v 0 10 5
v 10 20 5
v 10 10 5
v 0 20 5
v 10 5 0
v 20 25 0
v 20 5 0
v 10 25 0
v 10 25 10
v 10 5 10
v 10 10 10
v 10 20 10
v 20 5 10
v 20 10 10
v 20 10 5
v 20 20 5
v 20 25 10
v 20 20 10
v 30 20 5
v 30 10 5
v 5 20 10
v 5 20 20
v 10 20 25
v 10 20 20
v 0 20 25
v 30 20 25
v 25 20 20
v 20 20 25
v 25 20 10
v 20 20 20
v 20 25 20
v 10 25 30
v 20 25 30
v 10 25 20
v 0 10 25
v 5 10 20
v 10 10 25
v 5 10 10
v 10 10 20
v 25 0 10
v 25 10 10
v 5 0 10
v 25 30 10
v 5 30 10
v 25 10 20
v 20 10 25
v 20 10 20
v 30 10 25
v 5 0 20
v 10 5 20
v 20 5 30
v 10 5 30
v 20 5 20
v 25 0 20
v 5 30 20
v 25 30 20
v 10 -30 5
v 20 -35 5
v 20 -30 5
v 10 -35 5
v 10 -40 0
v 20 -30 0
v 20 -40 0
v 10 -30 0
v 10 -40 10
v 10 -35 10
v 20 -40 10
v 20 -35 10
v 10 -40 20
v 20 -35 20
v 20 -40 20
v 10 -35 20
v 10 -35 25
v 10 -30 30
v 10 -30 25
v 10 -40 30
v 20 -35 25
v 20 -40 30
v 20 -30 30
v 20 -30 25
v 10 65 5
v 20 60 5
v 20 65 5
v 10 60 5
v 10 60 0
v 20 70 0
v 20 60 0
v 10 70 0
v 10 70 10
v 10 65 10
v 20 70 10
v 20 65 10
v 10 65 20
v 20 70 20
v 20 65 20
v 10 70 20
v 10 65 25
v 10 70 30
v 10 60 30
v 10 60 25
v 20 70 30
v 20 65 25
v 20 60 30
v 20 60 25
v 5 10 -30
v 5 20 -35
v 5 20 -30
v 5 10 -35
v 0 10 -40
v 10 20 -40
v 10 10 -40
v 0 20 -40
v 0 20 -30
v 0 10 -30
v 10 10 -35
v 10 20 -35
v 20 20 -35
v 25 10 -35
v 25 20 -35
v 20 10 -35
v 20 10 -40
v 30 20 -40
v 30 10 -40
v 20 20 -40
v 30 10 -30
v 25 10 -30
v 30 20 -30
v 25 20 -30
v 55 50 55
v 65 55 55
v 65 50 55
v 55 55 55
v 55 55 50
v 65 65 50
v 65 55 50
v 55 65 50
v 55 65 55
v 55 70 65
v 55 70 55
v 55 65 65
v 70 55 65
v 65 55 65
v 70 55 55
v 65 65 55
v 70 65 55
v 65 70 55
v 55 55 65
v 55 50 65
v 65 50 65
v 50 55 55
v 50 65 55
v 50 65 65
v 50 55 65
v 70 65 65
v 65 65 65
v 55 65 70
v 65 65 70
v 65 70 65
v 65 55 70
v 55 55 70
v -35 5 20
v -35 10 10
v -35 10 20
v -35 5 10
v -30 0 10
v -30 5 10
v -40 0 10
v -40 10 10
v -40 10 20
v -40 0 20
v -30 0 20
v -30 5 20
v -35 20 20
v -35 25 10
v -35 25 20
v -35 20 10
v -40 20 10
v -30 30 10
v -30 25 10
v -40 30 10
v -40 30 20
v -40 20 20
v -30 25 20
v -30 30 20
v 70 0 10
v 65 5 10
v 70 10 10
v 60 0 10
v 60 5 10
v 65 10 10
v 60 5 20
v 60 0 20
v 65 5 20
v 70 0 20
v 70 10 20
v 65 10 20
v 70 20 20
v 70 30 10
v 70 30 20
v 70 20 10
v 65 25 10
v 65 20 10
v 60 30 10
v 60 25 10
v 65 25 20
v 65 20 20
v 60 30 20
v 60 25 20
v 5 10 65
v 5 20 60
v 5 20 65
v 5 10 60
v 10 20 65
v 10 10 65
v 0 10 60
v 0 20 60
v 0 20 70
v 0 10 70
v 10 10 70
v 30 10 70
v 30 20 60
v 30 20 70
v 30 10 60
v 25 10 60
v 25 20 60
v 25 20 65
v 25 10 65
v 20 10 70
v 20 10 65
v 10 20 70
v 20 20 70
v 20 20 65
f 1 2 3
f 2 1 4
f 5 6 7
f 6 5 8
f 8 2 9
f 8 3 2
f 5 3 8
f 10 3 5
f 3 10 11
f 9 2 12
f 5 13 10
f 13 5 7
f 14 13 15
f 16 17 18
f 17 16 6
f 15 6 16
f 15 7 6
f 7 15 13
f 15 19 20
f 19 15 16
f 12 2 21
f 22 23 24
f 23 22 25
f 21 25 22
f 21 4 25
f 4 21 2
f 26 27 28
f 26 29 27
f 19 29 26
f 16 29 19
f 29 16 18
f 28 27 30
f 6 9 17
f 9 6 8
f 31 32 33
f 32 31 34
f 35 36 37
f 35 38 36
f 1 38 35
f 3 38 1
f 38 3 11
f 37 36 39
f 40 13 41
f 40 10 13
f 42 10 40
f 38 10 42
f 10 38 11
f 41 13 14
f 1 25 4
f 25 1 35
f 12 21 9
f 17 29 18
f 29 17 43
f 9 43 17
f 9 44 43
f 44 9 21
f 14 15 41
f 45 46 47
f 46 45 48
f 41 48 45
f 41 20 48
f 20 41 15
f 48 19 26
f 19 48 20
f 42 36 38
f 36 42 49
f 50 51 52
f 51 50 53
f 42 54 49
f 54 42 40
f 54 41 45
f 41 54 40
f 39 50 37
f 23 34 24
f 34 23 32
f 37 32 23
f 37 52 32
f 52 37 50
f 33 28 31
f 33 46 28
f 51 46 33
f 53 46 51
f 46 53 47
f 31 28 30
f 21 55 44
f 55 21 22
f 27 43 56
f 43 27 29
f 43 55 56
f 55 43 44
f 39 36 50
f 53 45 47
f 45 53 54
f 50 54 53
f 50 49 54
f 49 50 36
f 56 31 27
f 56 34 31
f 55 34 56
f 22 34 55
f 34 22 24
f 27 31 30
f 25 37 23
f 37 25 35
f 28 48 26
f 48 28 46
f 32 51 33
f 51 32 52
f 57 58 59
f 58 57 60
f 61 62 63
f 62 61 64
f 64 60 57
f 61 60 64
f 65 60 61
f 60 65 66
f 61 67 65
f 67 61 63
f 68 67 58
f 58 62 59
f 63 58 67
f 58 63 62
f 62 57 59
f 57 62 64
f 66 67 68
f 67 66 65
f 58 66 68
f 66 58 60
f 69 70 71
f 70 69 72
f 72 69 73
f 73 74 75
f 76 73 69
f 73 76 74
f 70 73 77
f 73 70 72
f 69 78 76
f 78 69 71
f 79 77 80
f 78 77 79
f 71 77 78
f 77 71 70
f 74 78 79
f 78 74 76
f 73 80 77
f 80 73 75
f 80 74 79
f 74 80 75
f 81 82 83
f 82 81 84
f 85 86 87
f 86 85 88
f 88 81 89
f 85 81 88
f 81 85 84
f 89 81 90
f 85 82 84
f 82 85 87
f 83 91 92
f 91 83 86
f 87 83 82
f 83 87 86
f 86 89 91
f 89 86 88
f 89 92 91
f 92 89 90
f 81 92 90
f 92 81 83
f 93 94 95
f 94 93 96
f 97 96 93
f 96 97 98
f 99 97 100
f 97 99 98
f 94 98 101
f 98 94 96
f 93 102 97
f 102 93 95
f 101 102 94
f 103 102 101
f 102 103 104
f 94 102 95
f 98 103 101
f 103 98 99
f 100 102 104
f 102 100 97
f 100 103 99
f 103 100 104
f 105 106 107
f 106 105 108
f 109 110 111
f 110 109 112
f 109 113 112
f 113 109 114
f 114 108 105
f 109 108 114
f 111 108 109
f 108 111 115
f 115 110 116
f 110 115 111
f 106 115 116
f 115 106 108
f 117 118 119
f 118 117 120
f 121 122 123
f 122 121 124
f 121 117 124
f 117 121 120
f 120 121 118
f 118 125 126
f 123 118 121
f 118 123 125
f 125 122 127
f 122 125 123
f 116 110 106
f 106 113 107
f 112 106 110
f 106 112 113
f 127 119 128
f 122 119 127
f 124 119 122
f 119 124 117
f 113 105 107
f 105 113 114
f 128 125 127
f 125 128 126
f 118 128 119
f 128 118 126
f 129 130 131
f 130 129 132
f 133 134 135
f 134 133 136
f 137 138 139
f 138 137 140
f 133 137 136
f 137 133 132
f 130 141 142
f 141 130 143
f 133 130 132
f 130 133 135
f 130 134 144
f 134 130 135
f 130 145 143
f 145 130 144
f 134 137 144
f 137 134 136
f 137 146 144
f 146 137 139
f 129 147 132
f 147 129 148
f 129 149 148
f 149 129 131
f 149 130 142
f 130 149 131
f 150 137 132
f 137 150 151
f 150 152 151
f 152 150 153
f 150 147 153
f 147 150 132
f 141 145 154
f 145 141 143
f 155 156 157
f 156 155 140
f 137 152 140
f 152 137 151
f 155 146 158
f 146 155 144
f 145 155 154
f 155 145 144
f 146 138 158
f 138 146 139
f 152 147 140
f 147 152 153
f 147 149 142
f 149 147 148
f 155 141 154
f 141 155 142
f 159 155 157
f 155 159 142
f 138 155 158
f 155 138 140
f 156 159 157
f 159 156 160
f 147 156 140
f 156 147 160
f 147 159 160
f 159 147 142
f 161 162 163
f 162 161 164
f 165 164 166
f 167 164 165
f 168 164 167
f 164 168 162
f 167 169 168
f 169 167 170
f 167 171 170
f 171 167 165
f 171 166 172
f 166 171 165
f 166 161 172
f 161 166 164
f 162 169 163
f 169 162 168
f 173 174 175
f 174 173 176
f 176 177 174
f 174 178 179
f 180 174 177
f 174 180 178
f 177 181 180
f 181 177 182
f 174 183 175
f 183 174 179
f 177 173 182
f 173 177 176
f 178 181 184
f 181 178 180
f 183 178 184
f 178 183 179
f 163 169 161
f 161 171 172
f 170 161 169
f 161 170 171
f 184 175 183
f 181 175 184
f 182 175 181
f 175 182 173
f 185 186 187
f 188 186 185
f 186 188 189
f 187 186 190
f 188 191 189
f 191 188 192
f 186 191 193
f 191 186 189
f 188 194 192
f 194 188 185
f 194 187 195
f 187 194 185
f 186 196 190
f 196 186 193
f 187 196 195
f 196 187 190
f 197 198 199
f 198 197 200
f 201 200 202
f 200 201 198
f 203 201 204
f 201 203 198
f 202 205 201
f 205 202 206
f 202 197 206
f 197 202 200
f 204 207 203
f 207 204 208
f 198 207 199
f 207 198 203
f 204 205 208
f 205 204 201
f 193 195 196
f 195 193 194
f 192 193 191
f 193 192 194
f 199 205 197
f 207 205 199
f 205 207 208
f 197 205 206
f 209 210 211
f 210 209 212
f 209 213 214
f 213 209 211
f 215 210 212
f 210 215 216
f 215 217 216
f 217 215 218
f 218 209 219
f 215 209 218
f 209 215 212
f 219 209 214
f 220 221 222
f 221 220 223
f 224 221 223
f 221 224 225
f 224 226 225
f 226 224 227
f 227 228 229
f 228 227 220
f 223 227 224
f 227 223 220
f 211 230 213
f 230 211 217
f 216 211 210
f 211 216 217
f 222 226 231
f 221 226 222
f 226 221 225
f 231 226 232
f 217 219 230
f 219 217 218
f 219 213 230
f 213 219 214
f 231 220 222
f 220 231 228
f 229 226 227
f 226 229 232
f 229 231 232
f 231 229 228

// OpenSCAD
// SCAD file for Six Piece Burr Puzzle
// 整体模型
union() {
  translate([10, 5, 0]) color([0, 0.8, 0, 0.85]) cube([5, 5, 5]);
  translate([15, 5, 0]) color([0, 0.8, 0, 0.85]) cube([5, 5, 5]);
  translate([10, 10, 0]) color([0, 0.8, 0, 0.85]) cube([5, 5, 5]);
  translate([15, 10, 0]) color([0, 0.8, 0, 0.85]) cube([5, 5, 5]);
  translate([10, 15, 0]) color([1, 0, 0, 0.85]) cube([5, 5, 5]);
  translate([15, 15, 0]) color([1, 0, 0, 0.85]) cube([5, 5, 5]);
  translate([10, 20, 0]) color([1, 0, 0, 0.85]) cube([5, 5, 5]);
  translate([15, 20, 0]) color([1, 0, 0, 0.85]) cube([5, 5, 5]);
  translate([10, 5, 5]) color([0, 0.8, 0, 0.85]) cube([5, 5, 5]);
  translate([15, 5, 5]) color([0, 0.8, 0, 0.85]) cube([5, 5, 5]);
  translate([0, 10, 5]) color([1, 0.8, 0, 0.85]) cube([5, 5, 5]);
  translate([5, 10, 5]) color([1, 0.8, 0, 0.85]) cube([5, 5, 5]);
  translate([10, 10, 5]) color([0.8, 0.8, 0.8, 0.85]) cube([5, 5, 5]);
  translate([15, 10, 5]) color([0.8, 0.8, 0.8, 0.85]) cube([5, 5, 5]);
  translate([20, 10, 5]) color([1, 0.8, 0, 0.85]) cube([5, 5, 5]);
  translate([25, 10, 5]) color([1, 0.8, 0, 0.85]) cube([5, 5, 5]);
  translate([0, 15, 5]) color([1, 0.8, 0, 0.85]) cube([5, 5, 5]);
  translate([5, 15, 5]) color([1, 0.8, 0, 0.85]) cube([5, 5, 5]);
  translate([10, 15, 5]) color([0.8, 0.8, 0.8, 0.85]) cube([5, 5, 5]);
  translate([15, 15, 5]) color([0.8, 0.8, 0.8, 0.85]) cube([5, 5, 5]);
  translate([20, 15, 5]) color([1, 0.8, 0, 0.85]) cube([5, 5, 5]);
  translate([25, 15, 5]) color([1, 0.8, 0, 0.85]) cube([5, 5, 5]);
  translate([10, 20, 5]) color([1, 0, 0, 0.85]) cube([5, 5, 5]);
  translate([15, 20, 5]) color([1, 0, 0, 0.85]) cube([5, 5, 5]);
  translate([5, 0, 10]) color([0.6, 0, 1, 0.85]) cube([5, 5, 5]);
  translate([10, 0, 10]) color([0.6, 0, 1, 0.85]) cube([5, 5, 5]);
  translate([15, 0, 10]) color([1, 0.4, 0, 0.85]) cube([5, 5, 5]);
  translate([20, 0, 10]) color([1, 0.4, 0, 0.85]) cube([5, 5, 5]);
  translate([5, 5, 10]) color([0.6, 0, 1, 0.85]) cube([5, 5, 5]);
  translate([10, 5, 10]) color([0.8, 0.8, 0.8, 0.85]) cube([5, 5, 5]);
  translate([15, 5, 10]) color([0.8, 0.8, 0.8, 0.85]) cube([5, 5, 5]);
  translate([20, 5, 10]) color([1, 0.4, 0, 0.85]) cube([5, 5, 5]);
  translate([0, 10, 10]) color([1, 0.8, 0, 0.85]) cube([5, 5, 5]);
  translate([5, 10, 10]) color([0.8, 0.8, 0.8, 0.85]) cube([5, 5, 5]);
  translate([10, 10, 10]) color([0.8, 0.8, 0.8, 0.85]) cube([5, 5, 5]);
  translate([15, 10, 10]) color([0.8, 0.8, 0.8, 0.85]) cube([5, 5, 5]);
  translate([20, 10, 10]) color([0.8, 0.8, 0.8, 0.85]) cube([5, 5, 5]);
  translate([25, 10, 10]) color([1, 0.8, 0, 0.85]) cube([5, 5, 5]);
  translate([0, 15, 10]) color([1, 0.8, 0, 0.85]) cube([5, 5, 5]);
  translate([5, 15, 10]) color([0.8, 0.8, 0.8, 0.85]) cube([5, 5, 5]);
  translate([10, 15, 10]) color([0.8, 0.8, 0.8, 0.85]) cube([5, 5, 5]);
  translate([15, 15, 10]) color([0.8, 0.8, 0.8, 0.85]) cube([5, 5, 5]);
  translate([20, 15, 10]) color([0.8, 0.8, 0.8, 0.85]) cube([5, 5, 5]);
  translate([25, 15, 10]) color([1, 0.8, 0, 0.85]) cube([5, 5, 5]);
  translate([5, 20, 10]) color([0.6, 0, 1, 0.85]) cube([5, 5, 5]);
  translate([10, 20, 10]) color([0.8, 0.8, 0.8, 0.85]) cube([5, 5, 5]);
  translate([15, 20, 10]) color([0.8, 0.8, 0.8, 0.85]) cube([5, 5, 5]);
  translate([20, 20, 10]) color([1, 0.4, 0, 0.85]) cube([5, 5, 5]);
  translate([5, 25, 10]) color([0.6, 0, 1, 0.85]) cube([5, 5, 5]);
  translate([10, 25, 10]) color([0.6, 0, 1, 0.85]) cube([5, 5, 5]);
  translate([15, 25, 10]) color([1, 0.4, 0, 0.85]) cube([5, 5, 5]);
  translate([20, 25, 10]) color([1, 0.4, 0, 0.85]) cube([5, 5, 5]);
  translate([5, 0, 15]) color([0.6, 0, 1, 0.85]) cube([5, 5, 5]);
  translate([10, 0, 15]) color([0.6, 0, 1, 0.85]) cube([5, 5, 5]);
  translate([15, 0, 15]) color([1, 0.4, 0, 0.85]) cube([5, 5, 5]);
  translate([20, 0, 15]) color([1, 0.4, 0, 0.85]) cube([5, 5, 5]);
  translate([5, 5, 15]) color([0.6, 0, 1, 0.85]) cube([5, 5, 5]);
  translate([10, 5, 15]) color([0.8, 0.8, 0.8, 0.85]) cube([5, 5, 5]);
  translate([15, 5, 15]) color([0.8, 0.8, 0.8, 0.85]) cube([5, 5, 5]);
  translate([20, 5, 15]) color([1, 0.4, 0, 0.85]) cube([5, 5, 5]);
  translate([0, 10, 15]) color([0, 0.4, 1, 0.85]) cube([5, 5, 5]);
  translate([5, 10, 15]) color([0.8, 0.8, 0.8, 0.85]) cube([5, 5, 5]);
  translate([10, 10, 15]) color([0.8, 0.8, 0.8, 0.85]) cube([5, 5, 5]);
  translate([15, 10, 15]) color([0.8, 0.8, 0.8, 0.85]) cube([5, 5, 5]);
  translate([20, 10, 15]) color([0.8, 0.8, 0.8, 0.85]) cube([5, 5, 5]);
  translate([25, 10, 15]) color([0, 0.4, 1, 0.85]) cube([5, 5, 5]);
  translate([0, 15, 15]) color([0, 0.4, 1, 0.85]) cube([5, 5, 5]);
  translate([5, 15, 15]) color([0.8, 0.8, 0.8, 0.85]) cube([5, 5, 5]);
  translate([10, 15, 15]) color([0.8, 0.8, 0.8, 0.85]) cube([5, 5, 5]);
  translate([15, 15, 15]) color([0.8, 0.8, 0.8, 0.85]) cube([5, 5, 5]);
  translate([20, 15, 15]) color([0.8, 0.8, 0.8, 0.85]) cube([5, 5, 5]);
  translate([25, 15, 15]) color([0, 0.4, 1, 0.85]) cube([5, 5, 5]);
  translate([5, 20, 15]) color([0.6, 0, 1, 0.85]) cube([5, 5, 5]);
  translate([10, 20, 15]) color([0.8, 0.8, 0.8, 0.85]) cube([5, 5, 5]);
  translate([15, 20, 15]) color([0.8, 0.8, 0.8, 0.85]) cube([5, 5, 5]);
  translate([20, 20, 15]) color([1, 0.4, 0, 0.85]) cube([5, 5, 5]);
  translate([5, 25, 15]) color([0.6, 0, 1, 0.85]) cube([5, 5, 5]);
  translate([10, 25, 15]) color([0.6, 0, 1, 0.85]) cube([5, 5, 5]);
  translate([15, 25, 15]) color([1, 0.4, 0, 0.85]) cube([5, 5, 5]);
  translate([20, 25, 15]) color([1, 0.4, 0, 0.85]) cube([5, 5, 5]);
  translate([10, 5, 20]) color([0, 0.8, 0, 0.85]) cube([5, 5, 5]);
  translate([15, 5, 20]) color([0, 0.8, 0, 0.85]) cube([5, 5, 5]);
  translate([0, 10, 20]) color([0, 0.4, 1, 0.85]) cube([5, 5, 5]);
  translate([5, 10, 20]) color([0, 0.4, 1, 0.85]) cube([5, 5, 5]);
  translate([10, 10, 20]) color([0.8, 0.8, 0.8, 0.85]) cube([5, 5, 5]);
  translate([15, 10, 20]) color([0.8, 0.8, 0.8, 0.85]) cube([5, 5, 5]);
  translate([20, 10, 20]) color([0, 0.4, 1, 0.85]) cube([5, 5, 5]);
  translate([25, 10, 20]) color([0, 0.4, 1, 0.85]) cube([5, 5, 5]);
  translate([0, 15, 20]) color([0, 0.4, 1, 0.85]) cube([5, 5, 5]);
  translate([5, 15, 20]) color([0, 0.4, 1, 0.85]) cube([5, 5, 5]);
  translate([10, 15, 20]) color([0.8, 0.8, 0.8, 0.85]) cube([5, 5, 5]);
  translate([15, 15, 20]) color([0.8, 0.8, 0.8, 0.85]) cube([5, 5, 5]);
  translate([20, 15, 20]) color([0, 0.4, 1, 0.85]) cube([5, 5, 5]);
  translate([25, 15, 20]) color([0, 0.4, 1, 0.85]) cube([5, 5, 5]);
  translate([10, 20, 20]) color([1, 0, 0, 0.85]) cube([5, 5, 5]);
  translate([15, 20, 20]) color([1, 0, 0, 0.85]) cube([5, 5, 5]);
  translate([10, 5, 25]) color([0, 0.8, 0, 0.85]) cube([5, 5, 5]);
  translate([15, 5, 25]) color([0, 0.8, 0, 0.85]) cube([5, 5, 5]);
  translate([10, 10, 25]) color([0, 0.8, 0, 0.85]) cube([5, 5, 5]);
  translate([15, 10, 25]) color([0, 0.8, 0, 0.85]) cube([5, 5, 5]);
  translate([10, 15, 25]) color([1, 0, 0, 0.85]) cube([5, 5, 5]);
  translate([15, 15, 25]) color([1, 0, 0, 0.85]) cube([5, 5, 5]);
  translate([10, 20, 25]) color([1, 0, 0, 0.85]) cube([5, 5, 5]);
  translate([15, 20, 25]) color([1, 0, 0, 0.85]) cube([5, 5, 5]);
}

// 零件 B
union() {
  translate([10.0, -40.0, 0.0]) color([0, 0.8, 0, 0.85]) cube([5, 5, 5]);
  translate([15.0, -40.0, 0.0]) color([0, 0.8, 0, 0.85]) cube([5, 5, 5]);
  translate([10.0, -35.0, 0.0]) color([0, 0.8, 0, 0.85]) cube([5, 5, 5]);
  translate([15.0, -35.0, 0.0]) color([0, 0.8, 0, 0.85]) cube([5, 5, 5]);
  translate([10.0, -40.0, 5.0]) color([0, 0.8, 0, 0.85]) cube([5, 5, 5]);
  translate([15.0, -40.0, 5.0]) color([0, 0.8, 0, 0.85]) cube([5, 5, 5]);
  translate([10.0, -40.0, 20.0]) color([0, 0.8, 0, 0.85]) cube([5, 5, 5]);
  translate([15.0, -40.0, 20.0]) color([0, 0.8, 0, 0.85]) cube([5, 5, 5]);
  translate([10.0, -40.0, 25.0]) color([0, 0.8, 0, 0.85]) cube([5, 5, 5]);
  translate([15.0, -40.0, 25.0]) color([0, 0.8, 0, 0.85]) cube([5, 5, 5]);
  translate([10.0, -35.0, 25.0]) color([0, 0.8, 0, 0.85]) cube([5, 5, 5]);
  translate([15.0, -35.0, 25.0]) color([0, 0.8, 0, 0.85]) cube([5, 5, 5]);
}

// 零件 A
union() {
  translate([10.0, 60.0, 0.0]) color([1, 0, 0, 0.85]) cube([5, 5, 5]);
  translate([15.0, 60.0, 0.0]) color([1, 0, 0, 0.85]) cube([5, 5, 5]);
  translate([10.0, 65.0, 0.0]) color([1, 0, 0, 0.85]) cube([5, 5, 5]);
  translate([15.0, 65.0, 0.0]) color([1, 0, 0, 0.85]) cube([5, 5, 5]);
  translate([10.0, 65.0, 5.0]) color([1, 0, 0, 0.85]) cube([5, 5, 5]);
  translate([15.0, 65.0, 5.0]) color([1, 0, 0, 0.85]) cube([5, 5, 5]);
  translate([10.0, 65.0, 20.0]) color([1, 0, 0, 0.85]) cube([5, 5, 5]);
  translate([15.0, 65.0, 20.0]) color([1, 0, 0, 0.85]) cube([5, 5, 5]);
  translate([10.0, 60.0, 25.0]) color([1, 0, 0, 0.85]) cube([5, 5, 5]);
  translate([15.0, 60.0, 25.0]) color([1, 0, 0, 0.85]) cube([5, 5, 5]);
  translate([10.0, 65.0, 25.0]) color([1, 0, 0, 0.85]) cube([5, 5, 5]);
  translate([15.0, 65.0, 25.0]) color([1, 0, 0, 0.85]) cube([5, 5, 5]);
}

// 零件 D
union() {
  translate([0.0, 10.0, -40.0]) color([1, 0.8, 0, 0.85]) cube([5, 5, 5]);
  translate([5.0, 10.0, -40.0]) color([1, 0.8, 0, 0.85]) cube([5, 5, 5]);
  translate([20.0, 10.0, -40.0]) color([1, 0.8, 0, 0.85]) cube([5, 5, 5]);
  translate([25.0, 10.0, -40.0]) color([1, 0.8, 0, 0.85]) cube([5, 5, 5]);
  translate([0.0, 15.0, -40.0]) color([1, 0.8, 0, 0.85]) cube([5, 5, 5]);
  translate([5.0, 15.0, -40.0]) color([1, 0.8, 0, 0.85]) cube([5, 5, 5]);
  translate([20.0, 15.0, -40.0]) color([1, 0.8, 0, 0.85]) cube([5, 5, 5]);
  translate([25.0, 15.0, -40.0]) color([1, 0.8, 0, 0.85]) cube([5, 5, 5]);
  translate([0.0, 10.0, -35.0]) color([1, 0.8, 0, 0.85]) cube([5, 5, 5]);
  translate([25.0, 10.0, -35.0]) color([1, 0.8, 0, 0.85]) cube([5, 5, 5]);
  translate([0.0, 15.0, -35.0]) color([1, 0.8, 0, 0.85]) cube([5, 5, 5]);
  translate([25.0, 15.0, -35.0]) color([1, 0.8, 0, 0.85]) cube([5, 5, 5]);
}

// 零件 public
union() {
  translate([55.0, 55.0, 50.0]) color([0.8, 0.8, 0.8, 0.85]) cube([5, 5, 5]);
  translate([60.0, 55.0, 50.0]) color([0.8, 0.8, 0.8, 0.85]) cube([5, 5, 5]);
  translate([55.0, 60.0, 50.0]) color([0.8, 0.8, 0.8, 0.85]) cube([5, 5, 5]);
  translate([60.0, 60.0, 50.0]) color([0.8, 0.8, 0.8, 0.85]) cube([5, 5, 5]);
  translate([55.0, 50.0, 55.0]) color([0.8, 0.8, 0.8, 0.85]) cube([5, 5, 5]);
  translate([60.0, 50.0, 55.0]) color([0.8, 0.8, 0.8, 0.85]) cube([5, 5, 5]);
  translate([50.0, 55.0, 55.0]) color([0.8, 0.8, 0.8, 0.85]) cube([5, 5, 5]);
  translate([55.0, 55.0, 55.0]) color([0.8, 0.8, 0.8, 0.85]) cube([5, 5, 5]);
  translate([60.0, 55.0, 55.0]) color([0.8, 0.8, 0.8, 0.85]) cube([5, 5, 5]);
  translate([65.0, 55.0, 55.0]) color([0.8, 0.8, 0.8, 0.85]) cube([5, 5, 5]);
  translate([50.0, 60.0, 55.0]) color([0.8, 0.8, 0.8, 0.85]) cube([5, 5, 5]);
  translate([55.0, 60.0, 55.0]) color([0.8, 0.8, 0.8, 0.85]) cube([5, 5, 5]);
  translate([60.0, 60.0, 55.0]) color([0.8, 0.8, 0.8, 0.85]) cube([5, 5, 5]);
  translate([65.0, 60.0, 55.0]) color([0.8, 0.8, 0.8, 0.85]) cube([5, 5, 5]);
  translate([55.0, 65.0, 55.0]) color([0.8, 0.8, 0.8, 0.85]) cube([5, 5, 5]);
  translate([60.0, 65.0, 55.0]) color([0.8, 0.8, 0.8, 0.85]) cube([5, 5, 5]);
  translate([55.0, 50.0, 60.0]) color([0.8, 0.8, 0.8, 0.85]) cube([5, 5, 5]);
  translate([60.0, 50.0, 60.0]) color([0.8, 0.8, 0.8, 0.85]) cube([5, 5, 5]);
  translate([50.0, 55.0, 60.0]) color([0.8, 0.8, 0.8, 0.85]) cube([5, 5, 5]);
  translate([55.0, 55.0, 60.0]) color([0.8, 0.8, 0.8, 0.85]) cube([5, 5, 5]);
  translate([60.0, 55.0, 60.0]) color([0.8, 0.8, 0.8, 0.85]) cube([5, 5, 5]);
  translate([65.0, 55.0, 60.0]) color([0.8, 0.8, 0.8, 0.85]) cube([5, 5, 5]);
  translate([50.0, 60.0, 60.0]) color([0.8, 0.8, 0.8, 0.85]) cube([5, 5, 5]);
  translate([55.0, 60.0, 60.0]) color([0.8, 0.8, 0.8, 0.85]) cube([5, 5, 5]);
  translate([60.0, 60.0, 60.0]) color([0.8, 0.8, 0.8, 0.85]) cube([5, 5, 5]);
  translate([65.0, 60.0, 60.0]) color([0.8, 0.8, 0.8, 0.85]) cube([5, 5, 5]);
  translate([55.0, 65.0, 60.0]) color([0.8, 0.8, 0.8, 0.85]) cube([5, 5, 5]);
  translate([60.0, 65.0, 60.0]) color([0.8, 0.8, 0.8, 0.85]) cube([5, 5, 5]);
  translate([55.0, 55.0, 65.0]) color([0.8, 0.8, 0.8, 0.85]) cube([5, 5, 5]);
  translate([60.0, 55.0, 65.0]) color([0.8, 0.8, 0.8, 0.85]) cube([5, 5, 5]);
  translate([55.0, 60.0, 65.0]) color([0.8, 0.8, 0.8, 0.85]) cube([5, 5, 5]);
  translate([60.0, 60.0, 65.0]) color([0.8, 0.8, 0.8, 0.85]) cube([5, 5, 5]);
}

// 零件 F
union() {
  translate([-40.0, 0.0, 10.0]) color([0.6, 0, 1, 0.85]) cube([5, 5, 5]);
  translate([-35.0, 0.0, 10.0]) color([0.6, 0, 1, 0.85]) cube([5, 5, 5]);
  translate([-40.0, 5.0, 10.0]) color([0.6, 0, 1, 0.85]) cube([5, 5, 5]);
  translate([-40.0, 20.0, 10.0]) color([0.6, 0, 1, 0.85]) cube([5, 5, 5]);
  translate([-40.0, 25.0, 10.0]) color([0.6, 0, 1, 0.85]) cube([5, 5, 5]);
  translate([-35.0, 25.0, 10.0]) color([0.6, 0, 1, 0.85]) cube([5, 5, 5]);
  translate([-40.0, 0.0, 15.0]) color([0.6, 0, 1, 0.85]) cube([5, 5, 5]);
  translate([-35.0, 0.0, 15.0]) color([0.6, 0, 1, 0.85]) cube([5, 5, 5]);
  translate([-40.0, 5.0, 15.0]) color([0.6, 0, 1, 0.85]) cube([5, 5, 5]);
  translate([-40.0, 20.0, 15.0]) color([0.6, 0, 1, 0.85]) cube([5, 5, 5]);
  translate([-40.0, 25.0, 15.0]) color([0.6, 0, 1, 0.85]) cube([5, 5, 5]);
  translate([-35.0, 25.0, 15.0]) color([0.6, 0, 1, 0.85]) cube([5, 5, 5]);
}

// 零件 E
union() {
  translate([60.0, 0.0, 10.0]) color([1, 0.4, 0, 0.85]) cube([5, 5, 5]);
  translate([65.0, 0.0, 10.0]) color([1, 0.4, 0, 0.85]) cube([5, 5, 5]);
  translate([65.0, 5.0, 10.0]) color([1, 0.4, 0, 0.85]) cube([5, 5, 5]);
  translate([65.0, 20.0, 10.0]) color([1, 0.4, 0, 0.85]) cube([5, 5, 5]);
  translate([60.0, 25.0, 10.0]) color([1, 0.4, 0, 0.85]) cube([5, 5, 5]);
  translate([65.0, 25.0, 10.0]) color([1, 0.4, 0, 0.85]) cube([5, 5, 5]);
  translate([60.0, 0.0, 15.0]) color([1, 0.4, 0, 0.85]) cube([5, 5, 5]);
  translate([65.0, 0.0, 15.0]) color([1, 0.4, 0, 0.85]) cube([5, 5, 5]);
  translate([65.0, 5.0, 15.0]) color([1, 0.4, 0, 0.85]) cube([5, 5, 5]);
  translate([65.0, 20.0, 15.0]) color([1, 0.4, 0, 0.85]) cube([5, 5, 5]);
  translate([60.0, 25.0, 15.0]) color([1, 0.4, 0, 0.85]) cube([5, 5, 5]);
  translate([65.0, 25.0, 15.0]) color([1, 0.4, 0, 0.85]) cube([5, 5, 5]);
}

// 零件 C
union() {
  translate([0.0, 10.0, 60.0]) color([0, 0.4, 1, 0.85]) cube([5, 5, 5]);
  translate([25.0, 10.0, 60.0]) color([0, 0.4, 1, 0.85]) cube([5, 5, 5]);
  translate([0.0, 15.0, 60.0]) color([0, 0.4, 1, 0.85]) cube([5, 5, 5]);
  translate([25.0, 15.0, 60.0]) color([0, 0.4, 1, 0.85]) cube([5, 5, 5]);
  translate([0.0, 10.0, 65.0]) color([0, 0.4, 1, 0.85]) cube([5, 5, 5]);
  translate([5.0, 10.0, 65.0]) color([0, 0.4, 1, 0.85]) cube([5, 5, 5]);
  translate([20.0, 10.0, 65.0]) color([0, 0.4, 1, 0.85]) cube([5, 5, 5]);
  translate([25.0, 10.0, 65.0]) color([0, 0.4, 1, 0.85]) cube([5, 5, 5]);
  translate([0.0, 15.0, 65.0]) color([0, 0.4, 1, 0.85]) cube([5, 5, 5]);
  translate([5.0, 15.0, 65.0]) color([0, 0.4, 1, 0.85]) cube([5, 5, 5]);
  translate([20.0, 15.0, 65.0]) color([0, 0.4, 1, 0.85]) cube([5, 5, 5]);
  translate([25.0, 15.0, 65.0]) color([0, 0.4, 1, 0.85]) cube([5, 5, 5]);
}
